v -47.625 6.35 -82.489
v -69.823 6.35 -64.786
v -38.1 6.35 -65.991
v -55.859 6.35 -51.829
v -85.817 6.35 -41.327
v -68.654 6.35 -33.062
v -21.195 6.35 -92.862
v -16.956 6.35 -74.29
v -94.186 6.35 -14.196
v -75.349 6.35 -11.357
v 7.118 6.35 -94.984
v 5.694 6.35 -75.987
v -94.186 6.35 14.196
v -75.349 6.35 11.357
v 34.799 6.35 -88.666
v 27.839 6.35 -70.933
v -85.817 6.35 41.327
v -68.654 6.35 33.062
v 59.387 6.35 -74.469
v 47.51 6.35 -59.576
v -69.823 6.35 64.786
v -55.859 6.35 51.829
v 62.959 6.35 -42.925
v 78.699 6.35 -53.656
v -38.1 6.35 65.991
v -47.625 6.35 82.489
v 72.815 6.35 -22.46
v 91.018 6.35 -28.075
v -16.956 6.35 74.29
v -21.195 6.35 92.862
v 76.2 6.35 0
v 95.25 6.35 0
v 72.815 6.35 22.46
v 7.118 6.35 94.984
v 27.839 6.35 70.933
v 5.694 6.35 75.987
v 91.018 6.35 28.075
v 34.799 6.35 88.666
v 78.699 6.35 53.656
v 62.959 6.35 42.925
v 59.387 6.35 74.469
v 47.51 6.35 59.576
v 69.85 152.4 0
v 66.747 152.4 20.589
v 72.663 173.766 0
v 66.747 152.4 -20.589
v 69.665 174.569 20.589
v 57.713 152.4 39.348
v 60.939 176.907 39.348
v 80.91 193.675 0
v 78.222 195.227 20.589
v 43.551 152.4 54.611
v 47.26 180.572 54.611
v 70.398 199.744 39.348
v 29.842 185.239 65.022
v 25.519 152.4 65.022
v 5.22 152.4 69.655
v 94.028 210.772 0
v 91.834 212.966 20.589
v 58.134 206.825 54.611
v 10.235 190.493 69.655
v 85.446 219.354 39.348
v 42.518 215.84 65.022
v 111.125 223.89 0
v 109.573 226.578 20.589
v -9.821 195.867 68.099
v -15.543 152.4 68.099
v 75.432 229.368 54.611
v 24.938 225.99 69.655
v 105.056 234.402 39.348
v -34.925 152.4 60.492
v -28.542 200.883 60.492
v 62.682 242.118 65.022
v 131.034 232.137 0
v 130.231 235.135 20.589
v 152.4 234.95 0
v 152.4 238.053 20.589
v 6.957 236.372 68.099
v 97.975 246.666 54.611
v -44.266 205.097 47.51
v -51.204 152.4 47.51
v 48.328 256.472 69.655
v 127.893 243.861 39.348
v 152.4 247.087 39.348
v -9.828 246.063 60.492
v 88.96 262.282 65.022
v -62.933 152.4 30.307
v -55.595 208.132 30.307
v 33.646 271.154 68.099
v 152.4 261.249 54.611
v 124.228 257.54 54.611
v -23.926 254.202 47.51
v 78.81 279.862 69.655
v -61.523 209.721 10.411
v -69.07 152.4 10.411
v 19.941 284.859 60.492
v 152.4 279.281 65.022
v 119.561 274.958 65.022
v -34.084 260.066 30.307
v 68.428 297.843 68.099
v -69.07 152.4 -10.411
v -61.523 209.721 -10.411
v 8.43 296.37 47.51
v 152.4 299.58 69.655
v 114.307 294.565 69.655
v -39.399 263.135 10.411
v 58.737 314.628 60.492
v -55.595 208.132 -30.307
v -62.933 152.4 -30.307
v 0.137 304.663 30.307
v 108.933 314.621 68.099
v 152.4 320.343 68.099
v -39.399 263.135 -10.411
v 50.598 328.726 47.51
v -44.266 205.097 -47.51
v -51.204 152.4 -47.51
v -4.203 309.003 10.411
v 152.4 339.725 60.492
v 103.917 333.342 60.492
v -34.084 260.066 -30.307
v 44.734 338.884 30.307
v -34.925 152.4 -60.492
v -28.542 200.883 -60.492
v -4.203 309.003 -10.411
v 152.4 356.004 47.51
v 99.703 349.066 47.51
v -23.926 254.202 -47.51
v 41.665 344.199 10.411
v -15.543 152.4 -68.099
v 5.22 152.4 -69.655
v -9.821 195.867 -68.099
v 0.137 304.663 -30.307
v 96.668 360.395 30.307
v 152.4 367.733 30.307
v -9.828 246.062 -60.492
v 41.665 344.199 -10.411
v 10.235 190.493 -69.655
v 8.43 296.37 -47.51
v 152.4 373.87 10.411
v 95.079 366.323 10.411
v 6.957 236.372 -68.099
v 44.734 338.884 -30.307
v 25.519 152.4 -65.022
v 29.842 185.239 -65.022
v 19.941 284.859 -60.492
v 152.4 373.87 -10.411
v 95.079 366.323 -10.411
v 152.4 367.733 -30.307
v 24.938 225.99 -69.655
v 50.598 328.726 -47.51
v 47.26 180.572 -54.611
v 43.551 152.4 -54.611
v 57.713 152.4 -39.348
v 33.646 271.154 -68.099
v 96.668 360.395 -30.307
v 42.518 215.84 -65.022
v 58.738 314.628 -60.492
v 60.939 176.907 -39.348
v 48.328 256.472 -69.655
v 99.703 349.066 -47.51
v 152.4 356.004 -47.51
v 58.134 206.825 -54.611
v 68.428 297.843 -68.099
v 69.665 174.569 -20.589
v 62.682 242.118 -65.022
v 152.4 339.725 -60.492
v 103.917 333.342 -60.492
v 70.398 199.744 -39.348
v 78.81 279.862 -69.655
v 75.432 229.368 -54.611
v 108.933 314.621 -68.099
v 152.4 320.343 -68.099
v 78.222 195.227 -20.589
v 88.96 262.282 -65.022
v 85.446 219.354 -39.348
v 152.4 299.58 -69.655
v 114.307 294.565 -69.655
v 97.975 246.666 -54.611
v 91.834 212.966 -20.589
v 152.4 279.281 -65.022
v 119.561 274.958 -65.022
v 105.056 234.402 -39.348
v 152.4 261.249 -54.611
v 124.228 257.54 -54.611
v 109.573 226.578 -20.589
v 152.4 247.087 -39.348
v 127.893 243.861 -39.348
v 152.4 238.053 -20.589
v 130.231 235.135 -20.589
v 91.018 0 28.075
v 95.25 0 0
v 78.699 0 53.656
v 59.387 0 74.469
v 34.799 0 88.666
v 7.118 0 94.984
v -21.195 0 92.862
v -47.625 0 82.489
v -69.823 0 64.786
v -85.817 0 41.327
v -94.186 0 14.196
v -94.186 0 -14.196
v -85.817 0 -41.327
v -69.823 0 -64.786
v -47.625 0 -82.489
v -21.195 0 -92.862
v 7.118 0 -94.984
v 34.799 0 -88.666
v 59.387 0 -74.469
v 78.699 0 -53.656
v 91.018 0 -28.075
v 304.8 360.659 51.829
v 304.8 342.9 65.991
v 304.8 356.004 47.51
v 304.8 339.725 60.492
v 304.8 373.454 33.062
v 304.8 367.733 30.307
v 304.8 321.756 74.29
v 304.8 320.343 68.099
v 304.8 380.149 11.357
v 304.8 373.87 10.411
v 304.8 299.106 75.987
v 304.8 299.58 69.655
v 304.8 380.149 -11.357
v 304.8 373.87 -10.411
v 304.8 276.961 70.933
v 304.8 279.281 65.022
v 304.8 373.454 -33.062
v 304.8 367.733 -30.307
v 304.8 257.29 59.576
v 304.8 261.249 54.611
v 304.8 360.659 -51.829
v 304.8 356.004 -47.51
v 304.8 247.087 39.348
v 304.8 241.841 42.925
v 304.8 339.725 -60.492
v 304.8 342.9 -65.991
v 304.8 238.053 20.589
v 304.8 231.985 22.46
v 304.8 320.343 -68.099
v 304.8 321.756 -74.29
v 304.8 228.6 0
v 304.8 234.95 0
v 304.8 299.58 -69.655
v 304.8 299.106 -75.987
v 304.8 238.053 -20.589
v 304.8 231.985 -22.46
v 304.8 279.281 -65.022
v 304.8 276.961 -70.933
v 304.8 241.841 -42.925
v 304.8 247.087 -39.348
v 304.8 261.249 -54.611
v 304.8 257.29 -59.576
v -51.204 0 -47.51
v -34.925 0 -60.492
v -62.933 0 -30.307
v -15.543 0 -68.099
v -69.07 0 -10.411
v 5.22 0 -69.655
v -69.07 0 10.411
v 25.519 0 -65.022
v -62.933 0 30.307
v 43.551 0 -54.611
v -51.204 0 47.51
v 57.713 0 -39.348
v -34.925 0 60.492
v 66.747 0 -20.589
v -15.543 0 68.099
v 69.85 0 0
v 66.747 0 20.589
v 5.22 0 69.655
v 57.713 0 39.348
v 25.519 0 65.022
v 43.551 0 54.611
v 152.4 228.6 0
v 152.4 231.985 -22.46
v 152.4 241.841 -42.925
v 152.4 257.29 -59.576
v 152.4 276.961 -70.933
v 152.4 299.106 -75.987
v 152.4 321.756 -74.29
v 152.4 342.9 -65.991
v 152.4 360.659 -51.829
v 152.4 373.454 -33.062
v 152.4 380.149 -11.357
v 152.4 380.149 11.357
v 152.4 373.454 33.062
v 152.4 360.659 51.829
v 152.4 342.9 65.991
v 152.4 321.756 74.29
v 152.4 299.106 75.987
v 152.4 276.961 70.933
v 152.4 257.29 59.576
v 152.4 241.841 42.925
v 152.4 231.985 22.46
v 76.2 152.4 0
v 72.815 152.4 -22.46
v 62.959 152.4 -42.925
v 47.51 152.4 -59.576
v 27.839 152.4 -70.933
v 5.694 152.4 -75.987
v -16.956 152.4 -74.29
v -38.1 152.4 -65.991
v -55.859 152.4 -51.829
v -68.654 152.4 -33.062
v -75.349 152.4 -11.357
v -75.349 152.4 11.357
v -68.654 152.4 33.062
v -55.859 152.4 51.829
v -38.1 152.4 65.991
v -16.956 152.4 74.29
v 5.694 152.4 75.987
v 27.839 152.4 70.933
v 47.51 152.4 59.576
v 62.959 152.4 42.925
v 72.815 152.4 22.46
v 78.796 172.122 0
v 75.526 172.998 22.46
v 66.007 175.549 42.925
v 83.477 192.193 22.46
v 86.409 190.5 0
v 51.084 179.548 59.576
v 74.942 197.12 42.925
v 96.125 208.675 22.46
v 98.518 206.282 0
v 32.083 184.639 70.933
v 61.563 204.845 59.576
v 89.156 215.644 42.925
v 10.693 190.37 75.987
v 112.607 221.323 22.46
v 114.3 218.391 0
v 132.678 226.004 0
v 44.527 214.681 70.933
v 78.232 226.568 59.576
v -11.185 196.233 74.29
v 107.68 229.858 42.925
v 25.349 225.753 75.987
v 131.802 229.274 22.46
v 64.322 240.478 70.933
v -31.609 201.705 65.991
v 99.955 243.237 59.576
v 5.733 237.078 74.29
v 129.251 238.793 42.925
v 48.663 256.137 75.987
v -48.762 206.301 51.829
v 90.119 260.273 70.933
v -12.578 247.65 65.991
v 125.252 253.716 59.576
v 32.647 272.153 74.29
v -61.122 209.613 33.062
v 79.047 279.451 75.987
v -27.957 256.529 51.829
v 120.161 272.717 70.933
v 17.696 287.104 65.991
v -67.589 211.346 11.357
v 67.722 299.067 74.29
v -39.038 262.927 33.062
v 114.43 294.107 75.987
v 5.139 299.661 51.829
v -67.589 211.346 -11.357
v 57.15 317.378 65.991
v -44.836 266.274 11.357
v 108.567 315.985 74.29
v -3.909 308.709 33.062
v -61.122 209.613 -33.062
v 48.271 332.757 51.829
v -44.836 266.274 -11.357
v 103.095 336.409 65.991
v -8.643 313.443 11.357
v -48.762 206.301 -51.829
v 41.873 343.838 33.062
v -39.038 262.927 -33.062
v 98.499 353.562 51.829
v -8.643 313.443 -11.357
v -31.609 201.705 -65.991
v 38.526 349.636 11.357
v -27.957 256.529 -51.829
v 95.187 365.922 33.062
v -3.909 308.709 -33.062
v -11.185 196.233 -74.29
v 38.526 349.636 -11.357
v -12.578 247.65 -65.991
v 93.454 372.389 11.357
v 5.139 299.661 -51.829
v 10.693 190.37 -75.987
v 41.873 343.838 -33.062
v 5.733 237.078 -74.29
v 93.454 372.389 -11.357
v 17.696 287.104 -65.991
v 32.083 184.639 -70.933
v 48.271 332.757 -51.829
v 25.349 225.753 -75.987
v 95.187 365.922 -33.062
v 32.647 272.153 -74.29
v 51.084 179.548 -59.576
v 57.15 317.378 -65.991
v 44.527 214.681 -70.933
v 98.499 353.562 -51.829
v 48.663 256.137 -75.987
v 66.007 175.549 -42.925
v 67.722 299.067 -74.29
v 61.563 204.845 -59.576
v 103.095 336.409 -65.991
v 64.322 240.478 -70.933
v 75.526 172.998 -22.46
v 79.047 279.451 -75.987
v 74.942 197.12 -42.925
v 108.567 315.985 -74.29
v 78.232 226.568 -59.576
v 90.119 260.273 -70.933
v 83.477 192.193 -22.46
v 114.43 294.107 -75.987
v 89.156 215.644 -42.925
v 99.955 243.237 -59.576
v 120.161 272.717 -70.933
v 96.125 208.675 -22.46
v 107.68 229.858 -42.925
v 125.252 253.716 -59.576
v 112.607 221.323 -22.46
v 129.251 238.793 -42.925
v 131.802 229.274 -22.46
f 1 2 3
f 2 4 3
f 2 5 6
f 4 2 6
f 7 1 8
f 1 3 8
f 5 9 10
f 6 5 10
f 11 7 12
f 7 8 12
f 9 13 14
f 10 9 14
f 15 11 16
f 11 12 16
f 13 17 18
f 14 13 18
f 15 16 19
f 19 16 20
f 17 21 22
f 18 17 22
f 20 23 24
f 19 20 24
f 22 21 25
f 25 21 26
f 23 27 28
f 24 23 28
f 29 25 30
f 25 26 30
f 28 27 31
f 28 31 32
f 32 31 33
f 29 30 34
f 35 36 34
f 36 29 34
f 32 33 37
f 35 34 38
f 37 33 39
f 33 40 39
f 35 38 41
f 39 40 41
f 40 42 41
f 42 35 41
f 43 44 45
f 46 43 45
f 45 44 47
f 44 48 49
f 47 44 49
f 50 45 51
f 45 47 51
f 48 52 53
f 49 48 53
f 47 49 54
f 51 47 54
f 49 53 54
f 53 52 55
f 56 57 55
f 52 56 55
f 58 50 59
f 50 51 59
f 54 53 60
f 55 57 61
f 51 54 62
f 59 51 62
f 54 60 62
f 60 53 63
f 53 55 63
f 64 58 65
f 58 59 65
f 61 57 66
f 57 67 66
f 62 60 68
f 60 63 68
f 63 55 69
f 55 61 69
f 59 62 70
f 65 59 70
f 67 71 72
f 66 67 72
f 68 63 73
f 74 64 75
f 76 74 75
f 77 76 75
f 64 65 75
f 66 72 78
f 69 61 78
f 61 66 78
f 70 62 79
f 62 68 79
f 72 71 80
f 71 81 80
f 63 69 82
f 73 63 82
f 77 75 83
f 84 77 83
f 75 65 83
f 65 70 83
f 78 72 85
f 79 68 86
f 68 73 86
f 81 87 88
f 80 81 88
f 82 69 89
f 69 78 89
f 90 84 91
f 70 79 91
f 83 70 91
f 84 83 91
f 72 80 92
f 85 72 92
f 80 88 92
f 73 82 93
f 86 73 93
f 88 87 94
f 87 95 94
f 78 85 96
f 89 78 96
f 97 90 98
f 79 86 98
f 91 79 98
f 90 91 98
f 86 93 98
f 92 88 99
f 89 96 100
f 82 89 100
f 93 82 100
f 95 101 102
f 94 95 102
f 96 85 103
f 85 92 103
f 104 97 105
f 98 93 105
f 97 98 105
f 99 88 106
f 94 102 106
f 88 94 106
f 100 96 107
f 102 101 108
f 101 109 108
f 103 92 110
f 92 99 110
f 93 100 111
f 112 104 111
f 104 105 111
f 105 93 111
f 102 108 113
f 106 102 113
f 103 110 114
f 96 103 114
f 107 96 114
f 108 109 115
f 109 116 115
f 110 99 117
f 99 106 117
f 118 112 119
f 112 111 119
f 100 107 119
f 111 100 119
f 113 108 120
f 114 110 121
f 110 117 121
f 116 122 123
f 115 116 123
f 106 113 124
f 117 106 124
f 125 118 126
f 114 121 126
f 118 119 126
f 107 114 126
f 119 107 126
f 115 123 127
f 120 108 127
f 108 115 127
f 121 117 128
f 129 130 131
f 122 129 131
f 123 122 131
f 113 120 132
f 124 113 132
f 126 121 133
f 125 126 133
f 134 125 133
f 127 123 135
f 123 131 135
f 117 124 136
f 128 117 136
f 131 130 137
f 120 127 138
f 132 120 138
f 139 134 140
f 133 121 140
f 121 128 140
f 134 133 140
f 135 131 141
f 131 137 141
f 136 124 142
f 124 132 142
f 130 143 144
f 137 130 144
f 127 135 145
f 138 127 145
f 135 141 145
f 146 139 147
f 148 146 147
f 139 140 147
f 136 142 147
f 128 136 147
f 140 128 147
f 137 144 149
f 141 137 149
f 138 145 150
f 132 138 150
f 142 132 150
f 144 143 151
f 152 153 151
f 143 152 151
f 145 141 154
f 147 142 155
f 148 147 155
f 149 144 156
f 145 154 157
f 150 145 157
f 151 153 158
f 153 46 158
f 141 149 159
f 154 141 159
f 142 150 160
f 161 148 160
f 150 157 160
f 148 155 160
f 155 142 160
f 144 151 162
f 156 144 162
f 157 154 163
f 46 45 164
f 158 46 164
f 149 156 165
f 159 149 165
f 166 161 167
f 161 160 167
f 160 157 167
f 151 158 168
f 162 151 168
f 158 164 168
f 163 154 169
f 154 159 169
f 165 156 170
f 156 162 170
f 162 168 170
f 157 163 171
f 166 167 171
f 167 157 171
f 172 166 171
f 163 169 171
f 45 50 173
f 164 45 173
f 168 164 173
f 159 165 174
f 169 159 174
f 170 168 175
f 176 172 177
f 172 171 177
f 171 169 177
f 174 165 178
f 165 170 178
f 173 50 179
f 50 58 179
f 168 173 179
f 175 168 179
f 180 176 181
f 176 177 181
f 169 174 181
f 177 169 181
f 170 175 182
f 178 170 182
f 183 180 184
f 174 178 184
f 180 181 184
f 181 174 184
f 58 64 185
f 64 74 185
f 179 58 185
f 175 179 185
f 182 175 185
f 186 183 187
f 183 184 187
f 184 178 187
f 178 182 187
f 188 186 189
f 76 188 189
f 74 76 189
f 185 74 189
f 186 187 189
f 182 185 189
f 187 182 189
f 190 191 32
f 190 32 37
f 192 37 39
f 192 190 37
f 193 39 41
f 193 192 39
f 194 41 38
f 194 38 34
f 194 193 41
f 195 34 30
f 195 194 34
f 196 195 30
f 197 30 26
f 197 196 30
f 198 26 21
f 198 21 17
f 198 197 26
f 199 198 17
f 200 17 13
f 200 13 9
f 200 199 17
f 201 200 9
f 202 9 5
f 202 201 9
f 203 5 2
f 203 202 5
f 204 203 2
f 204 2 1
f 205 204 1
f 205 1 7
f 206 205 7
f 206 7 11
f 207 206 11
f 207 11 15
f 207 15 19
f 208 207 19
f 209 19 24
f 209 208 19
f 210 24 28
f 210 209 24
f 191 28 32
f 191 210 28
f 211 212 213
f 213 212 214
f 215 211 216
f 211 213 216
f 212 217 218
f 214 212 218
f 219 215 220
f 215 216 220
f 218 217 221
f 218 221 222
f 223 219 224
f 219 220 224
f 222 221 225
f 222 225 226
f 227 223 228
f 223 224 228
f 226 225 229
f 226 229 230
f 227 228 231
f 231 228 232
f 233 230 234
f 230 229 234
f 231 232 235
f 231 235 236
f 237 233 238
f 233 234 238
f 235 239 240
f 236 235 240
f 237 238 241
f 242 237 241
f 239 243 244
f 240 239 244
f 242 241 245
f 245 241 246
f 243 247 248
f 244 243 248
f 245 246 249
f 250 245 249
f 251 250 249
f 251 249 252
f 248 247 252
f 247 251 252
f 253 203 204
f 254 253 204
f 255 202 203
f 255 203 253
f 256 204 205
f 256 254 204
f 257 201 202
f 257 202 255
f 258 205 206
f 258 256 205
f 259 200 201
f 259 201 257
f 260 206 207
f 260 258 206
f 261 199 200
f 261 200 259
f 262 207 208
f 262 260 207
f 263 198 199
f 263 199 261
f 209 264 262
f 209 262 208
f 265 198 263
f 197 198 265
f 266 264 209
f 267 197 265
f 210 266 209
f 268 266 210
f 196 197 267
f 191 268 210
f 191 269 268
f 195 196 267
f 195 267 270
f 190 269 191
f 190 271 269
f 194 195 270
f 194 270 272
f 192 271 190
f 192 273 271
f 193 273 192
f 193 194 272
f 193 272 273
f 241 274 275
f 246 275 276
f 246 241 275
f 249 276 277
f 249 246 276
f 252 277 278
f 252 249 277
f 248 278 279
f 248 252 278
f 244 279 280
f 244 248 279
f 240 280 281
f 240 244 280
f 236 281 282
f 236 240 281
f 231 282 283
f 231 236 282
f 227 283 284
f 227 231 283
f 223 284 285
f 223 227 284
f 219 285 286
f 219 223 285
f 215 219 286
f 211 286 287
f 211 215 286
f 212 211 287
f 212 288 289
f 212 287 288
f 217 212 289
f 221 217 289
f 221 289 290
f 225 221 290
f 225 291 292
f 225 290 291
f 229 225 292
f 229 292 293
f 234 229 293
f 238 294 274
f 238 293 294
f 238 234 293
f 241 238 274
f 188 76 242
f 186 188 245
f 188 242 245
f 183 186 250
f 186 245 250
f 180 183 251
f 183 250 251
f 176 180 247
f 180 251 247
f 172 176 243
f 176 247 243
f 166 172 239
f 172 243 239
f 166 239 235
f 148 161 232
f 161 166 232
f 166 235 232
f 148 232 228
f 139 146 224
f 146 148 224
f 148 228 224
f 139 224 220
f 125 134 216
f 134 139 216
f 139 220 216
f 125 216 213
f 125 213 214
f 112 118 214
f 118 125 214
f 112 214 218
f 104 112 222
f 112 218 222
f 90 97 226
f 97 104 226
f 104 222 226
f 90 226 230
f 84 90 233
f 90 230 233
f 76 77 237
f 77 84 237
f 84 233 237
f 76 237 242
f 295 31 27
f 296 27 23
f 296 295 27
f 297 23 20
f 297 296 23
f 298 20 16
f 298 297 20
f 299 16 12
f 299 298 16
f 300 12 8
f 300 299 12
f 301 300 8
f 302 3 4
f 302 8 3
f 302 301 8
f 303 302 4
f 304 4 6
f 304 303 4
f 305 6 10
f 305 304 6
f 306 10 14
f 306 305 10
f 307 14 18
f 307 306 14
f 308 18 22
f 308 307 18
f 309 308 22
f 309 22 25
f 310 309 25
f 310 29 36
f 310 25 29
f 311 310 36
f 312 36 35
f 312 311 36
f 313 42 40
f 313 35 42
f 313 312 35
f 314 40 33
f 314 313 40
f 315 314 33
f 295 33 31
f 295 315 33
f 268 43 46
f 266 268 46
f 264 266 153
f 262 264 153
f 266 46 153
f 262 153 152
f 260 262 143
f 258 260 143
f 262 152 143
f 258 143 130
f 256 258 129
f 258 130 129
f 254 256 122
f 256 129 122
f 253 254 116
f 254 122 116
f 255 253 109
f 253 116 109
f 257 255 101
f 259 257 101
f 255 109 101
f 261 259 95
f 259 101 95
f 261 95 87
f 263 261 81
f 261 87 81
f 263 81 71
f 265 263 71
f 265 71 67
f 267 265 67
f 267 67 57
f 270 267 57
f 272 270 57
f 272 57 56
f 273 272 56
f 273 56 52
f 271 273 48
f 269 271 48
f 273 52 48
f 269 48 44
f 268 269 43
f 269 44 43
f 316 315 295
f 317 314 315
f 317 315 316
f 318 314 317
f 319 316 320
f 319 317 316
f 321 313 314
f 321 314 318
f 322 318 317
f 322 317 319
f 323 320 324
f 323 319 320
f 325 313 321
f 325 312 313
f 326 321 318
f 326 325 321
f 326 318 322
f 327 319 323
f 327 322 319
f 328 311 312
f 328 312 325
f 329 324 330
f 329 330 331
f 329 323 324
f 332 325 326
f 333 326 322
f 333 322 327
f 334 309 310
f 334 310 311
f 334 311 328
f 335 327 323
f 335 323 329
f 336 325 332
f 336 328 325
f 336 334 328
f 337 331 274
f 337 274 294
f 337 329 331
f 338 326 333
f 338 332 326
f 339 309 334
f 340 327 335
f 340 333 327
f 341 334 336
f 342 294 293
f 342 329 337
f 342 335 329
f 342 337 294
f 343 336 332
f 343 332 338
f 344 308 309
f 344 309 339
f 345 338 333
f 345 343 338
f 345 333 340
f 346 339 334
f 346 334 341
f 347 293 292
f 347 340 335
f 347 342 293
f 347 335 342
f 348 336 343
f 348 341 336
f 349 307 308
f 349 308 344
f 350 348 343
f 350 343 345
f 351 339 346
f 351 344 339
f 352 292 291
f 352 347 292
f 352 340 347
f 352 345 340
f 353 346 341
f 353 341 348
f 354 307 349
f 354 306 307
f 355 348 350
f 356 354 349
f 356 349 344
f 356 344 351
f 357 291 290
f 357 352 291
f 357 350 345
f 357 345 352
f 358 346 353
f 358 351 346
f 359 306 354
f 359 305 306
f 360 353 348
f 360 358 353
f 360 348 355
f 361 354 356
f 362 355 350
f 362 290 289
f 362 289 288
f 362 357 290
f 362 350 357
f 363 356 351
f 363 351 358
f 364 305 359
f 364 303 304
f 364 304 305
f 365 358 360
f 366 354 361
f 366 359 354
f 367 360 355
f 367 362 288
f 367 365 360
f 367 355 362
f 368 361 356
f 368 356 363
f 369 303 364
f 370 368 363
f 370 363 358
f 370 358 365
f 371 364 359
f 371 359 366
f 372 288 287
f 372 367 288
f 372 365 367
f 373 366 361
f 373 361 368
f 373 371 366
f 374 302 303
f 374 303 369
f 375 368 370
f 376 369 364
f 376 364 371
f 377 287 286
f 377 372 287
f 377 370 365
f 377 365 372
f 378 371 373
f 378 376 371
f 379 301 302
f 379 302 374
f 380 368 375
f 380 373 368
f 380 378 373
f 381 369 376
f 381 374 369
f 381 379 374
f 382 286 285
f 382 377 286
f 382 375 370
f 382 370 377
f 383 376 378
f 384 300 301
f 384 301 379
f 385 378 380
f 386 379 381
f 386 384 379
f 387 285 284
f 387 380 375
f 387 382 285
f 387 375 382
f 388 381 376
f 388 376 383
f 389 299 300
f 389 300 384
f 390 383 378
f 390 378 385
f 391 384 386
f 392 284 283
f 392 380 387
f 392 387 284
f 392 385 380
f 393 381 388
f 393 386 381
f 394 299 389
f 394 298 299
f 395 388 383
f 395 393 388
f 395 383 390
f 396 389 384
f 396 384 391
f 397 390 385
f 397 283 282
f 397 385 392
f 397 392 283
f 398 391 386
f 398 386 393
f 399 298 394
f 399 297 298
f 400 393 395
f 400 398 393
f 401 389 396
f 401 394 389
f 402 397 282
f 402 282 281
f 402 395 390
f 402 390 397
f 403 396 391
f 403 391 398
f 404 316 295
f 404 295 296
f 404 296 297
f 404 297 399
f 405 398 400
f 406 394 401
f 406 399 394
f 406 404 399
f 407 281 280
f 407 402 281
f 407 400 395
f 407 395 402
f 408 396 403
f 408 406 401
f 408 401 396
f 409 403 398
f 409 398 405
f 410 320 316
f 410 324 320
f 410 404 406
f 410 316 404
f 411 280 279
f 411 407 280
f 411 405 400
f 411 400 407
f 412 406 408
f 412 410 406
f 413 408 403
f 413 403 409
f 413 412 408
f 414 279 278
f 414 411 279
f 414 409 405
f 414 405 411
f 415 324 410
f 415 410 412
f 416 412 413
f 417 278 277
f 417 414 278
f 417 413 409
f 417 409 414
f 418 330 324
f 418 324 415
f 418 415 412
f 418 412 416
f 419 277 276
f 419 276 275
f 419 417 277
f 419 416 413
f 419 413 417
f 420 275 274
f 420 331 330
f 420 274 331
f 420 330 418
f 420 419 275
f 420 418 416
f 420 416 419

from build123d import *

# Parameters (mm, degrees)
F0_R     = 76.2
F3_T     = -6.35
F0_R_2   = 95.25
F4_DEPTH = 6.35


with BuildPart() as f2:
    # F2: sweep along a path in F1
    with BuildLine(Plane.XY) as f2_path:
        Line((0, 0), (0, 152.4))
        ThreePointArc((0, 152.4), (44.6369265472, 260.1630734528), (152.4, 304.8))
        Line((152.4, 304.8), (304.8, 304.8))
    # F0 (on Front) → F2 (sweep)
    with BuildSketch(Plane.XZ):
        Circle(F0_R)
    sweep(path=f2_path.line)

    # F3
    f3_openings = [f2.faces().sort_by_distance(p)[0] for p in [
        (0, 0, 0),
        (304.8, 304.8, 0),
    ]]
    offset(amount=F3_T, openings=f3_openings)

    # F0 (on Front) → F4 (join)
    with BuildSketch(Plane.XZ):
        Circle(F0_R_2)
        Circle(F0_R, mode=Mode.SUBTRACT)
    extrude(amount=-F4_DEPTH)


solid = f2.part
